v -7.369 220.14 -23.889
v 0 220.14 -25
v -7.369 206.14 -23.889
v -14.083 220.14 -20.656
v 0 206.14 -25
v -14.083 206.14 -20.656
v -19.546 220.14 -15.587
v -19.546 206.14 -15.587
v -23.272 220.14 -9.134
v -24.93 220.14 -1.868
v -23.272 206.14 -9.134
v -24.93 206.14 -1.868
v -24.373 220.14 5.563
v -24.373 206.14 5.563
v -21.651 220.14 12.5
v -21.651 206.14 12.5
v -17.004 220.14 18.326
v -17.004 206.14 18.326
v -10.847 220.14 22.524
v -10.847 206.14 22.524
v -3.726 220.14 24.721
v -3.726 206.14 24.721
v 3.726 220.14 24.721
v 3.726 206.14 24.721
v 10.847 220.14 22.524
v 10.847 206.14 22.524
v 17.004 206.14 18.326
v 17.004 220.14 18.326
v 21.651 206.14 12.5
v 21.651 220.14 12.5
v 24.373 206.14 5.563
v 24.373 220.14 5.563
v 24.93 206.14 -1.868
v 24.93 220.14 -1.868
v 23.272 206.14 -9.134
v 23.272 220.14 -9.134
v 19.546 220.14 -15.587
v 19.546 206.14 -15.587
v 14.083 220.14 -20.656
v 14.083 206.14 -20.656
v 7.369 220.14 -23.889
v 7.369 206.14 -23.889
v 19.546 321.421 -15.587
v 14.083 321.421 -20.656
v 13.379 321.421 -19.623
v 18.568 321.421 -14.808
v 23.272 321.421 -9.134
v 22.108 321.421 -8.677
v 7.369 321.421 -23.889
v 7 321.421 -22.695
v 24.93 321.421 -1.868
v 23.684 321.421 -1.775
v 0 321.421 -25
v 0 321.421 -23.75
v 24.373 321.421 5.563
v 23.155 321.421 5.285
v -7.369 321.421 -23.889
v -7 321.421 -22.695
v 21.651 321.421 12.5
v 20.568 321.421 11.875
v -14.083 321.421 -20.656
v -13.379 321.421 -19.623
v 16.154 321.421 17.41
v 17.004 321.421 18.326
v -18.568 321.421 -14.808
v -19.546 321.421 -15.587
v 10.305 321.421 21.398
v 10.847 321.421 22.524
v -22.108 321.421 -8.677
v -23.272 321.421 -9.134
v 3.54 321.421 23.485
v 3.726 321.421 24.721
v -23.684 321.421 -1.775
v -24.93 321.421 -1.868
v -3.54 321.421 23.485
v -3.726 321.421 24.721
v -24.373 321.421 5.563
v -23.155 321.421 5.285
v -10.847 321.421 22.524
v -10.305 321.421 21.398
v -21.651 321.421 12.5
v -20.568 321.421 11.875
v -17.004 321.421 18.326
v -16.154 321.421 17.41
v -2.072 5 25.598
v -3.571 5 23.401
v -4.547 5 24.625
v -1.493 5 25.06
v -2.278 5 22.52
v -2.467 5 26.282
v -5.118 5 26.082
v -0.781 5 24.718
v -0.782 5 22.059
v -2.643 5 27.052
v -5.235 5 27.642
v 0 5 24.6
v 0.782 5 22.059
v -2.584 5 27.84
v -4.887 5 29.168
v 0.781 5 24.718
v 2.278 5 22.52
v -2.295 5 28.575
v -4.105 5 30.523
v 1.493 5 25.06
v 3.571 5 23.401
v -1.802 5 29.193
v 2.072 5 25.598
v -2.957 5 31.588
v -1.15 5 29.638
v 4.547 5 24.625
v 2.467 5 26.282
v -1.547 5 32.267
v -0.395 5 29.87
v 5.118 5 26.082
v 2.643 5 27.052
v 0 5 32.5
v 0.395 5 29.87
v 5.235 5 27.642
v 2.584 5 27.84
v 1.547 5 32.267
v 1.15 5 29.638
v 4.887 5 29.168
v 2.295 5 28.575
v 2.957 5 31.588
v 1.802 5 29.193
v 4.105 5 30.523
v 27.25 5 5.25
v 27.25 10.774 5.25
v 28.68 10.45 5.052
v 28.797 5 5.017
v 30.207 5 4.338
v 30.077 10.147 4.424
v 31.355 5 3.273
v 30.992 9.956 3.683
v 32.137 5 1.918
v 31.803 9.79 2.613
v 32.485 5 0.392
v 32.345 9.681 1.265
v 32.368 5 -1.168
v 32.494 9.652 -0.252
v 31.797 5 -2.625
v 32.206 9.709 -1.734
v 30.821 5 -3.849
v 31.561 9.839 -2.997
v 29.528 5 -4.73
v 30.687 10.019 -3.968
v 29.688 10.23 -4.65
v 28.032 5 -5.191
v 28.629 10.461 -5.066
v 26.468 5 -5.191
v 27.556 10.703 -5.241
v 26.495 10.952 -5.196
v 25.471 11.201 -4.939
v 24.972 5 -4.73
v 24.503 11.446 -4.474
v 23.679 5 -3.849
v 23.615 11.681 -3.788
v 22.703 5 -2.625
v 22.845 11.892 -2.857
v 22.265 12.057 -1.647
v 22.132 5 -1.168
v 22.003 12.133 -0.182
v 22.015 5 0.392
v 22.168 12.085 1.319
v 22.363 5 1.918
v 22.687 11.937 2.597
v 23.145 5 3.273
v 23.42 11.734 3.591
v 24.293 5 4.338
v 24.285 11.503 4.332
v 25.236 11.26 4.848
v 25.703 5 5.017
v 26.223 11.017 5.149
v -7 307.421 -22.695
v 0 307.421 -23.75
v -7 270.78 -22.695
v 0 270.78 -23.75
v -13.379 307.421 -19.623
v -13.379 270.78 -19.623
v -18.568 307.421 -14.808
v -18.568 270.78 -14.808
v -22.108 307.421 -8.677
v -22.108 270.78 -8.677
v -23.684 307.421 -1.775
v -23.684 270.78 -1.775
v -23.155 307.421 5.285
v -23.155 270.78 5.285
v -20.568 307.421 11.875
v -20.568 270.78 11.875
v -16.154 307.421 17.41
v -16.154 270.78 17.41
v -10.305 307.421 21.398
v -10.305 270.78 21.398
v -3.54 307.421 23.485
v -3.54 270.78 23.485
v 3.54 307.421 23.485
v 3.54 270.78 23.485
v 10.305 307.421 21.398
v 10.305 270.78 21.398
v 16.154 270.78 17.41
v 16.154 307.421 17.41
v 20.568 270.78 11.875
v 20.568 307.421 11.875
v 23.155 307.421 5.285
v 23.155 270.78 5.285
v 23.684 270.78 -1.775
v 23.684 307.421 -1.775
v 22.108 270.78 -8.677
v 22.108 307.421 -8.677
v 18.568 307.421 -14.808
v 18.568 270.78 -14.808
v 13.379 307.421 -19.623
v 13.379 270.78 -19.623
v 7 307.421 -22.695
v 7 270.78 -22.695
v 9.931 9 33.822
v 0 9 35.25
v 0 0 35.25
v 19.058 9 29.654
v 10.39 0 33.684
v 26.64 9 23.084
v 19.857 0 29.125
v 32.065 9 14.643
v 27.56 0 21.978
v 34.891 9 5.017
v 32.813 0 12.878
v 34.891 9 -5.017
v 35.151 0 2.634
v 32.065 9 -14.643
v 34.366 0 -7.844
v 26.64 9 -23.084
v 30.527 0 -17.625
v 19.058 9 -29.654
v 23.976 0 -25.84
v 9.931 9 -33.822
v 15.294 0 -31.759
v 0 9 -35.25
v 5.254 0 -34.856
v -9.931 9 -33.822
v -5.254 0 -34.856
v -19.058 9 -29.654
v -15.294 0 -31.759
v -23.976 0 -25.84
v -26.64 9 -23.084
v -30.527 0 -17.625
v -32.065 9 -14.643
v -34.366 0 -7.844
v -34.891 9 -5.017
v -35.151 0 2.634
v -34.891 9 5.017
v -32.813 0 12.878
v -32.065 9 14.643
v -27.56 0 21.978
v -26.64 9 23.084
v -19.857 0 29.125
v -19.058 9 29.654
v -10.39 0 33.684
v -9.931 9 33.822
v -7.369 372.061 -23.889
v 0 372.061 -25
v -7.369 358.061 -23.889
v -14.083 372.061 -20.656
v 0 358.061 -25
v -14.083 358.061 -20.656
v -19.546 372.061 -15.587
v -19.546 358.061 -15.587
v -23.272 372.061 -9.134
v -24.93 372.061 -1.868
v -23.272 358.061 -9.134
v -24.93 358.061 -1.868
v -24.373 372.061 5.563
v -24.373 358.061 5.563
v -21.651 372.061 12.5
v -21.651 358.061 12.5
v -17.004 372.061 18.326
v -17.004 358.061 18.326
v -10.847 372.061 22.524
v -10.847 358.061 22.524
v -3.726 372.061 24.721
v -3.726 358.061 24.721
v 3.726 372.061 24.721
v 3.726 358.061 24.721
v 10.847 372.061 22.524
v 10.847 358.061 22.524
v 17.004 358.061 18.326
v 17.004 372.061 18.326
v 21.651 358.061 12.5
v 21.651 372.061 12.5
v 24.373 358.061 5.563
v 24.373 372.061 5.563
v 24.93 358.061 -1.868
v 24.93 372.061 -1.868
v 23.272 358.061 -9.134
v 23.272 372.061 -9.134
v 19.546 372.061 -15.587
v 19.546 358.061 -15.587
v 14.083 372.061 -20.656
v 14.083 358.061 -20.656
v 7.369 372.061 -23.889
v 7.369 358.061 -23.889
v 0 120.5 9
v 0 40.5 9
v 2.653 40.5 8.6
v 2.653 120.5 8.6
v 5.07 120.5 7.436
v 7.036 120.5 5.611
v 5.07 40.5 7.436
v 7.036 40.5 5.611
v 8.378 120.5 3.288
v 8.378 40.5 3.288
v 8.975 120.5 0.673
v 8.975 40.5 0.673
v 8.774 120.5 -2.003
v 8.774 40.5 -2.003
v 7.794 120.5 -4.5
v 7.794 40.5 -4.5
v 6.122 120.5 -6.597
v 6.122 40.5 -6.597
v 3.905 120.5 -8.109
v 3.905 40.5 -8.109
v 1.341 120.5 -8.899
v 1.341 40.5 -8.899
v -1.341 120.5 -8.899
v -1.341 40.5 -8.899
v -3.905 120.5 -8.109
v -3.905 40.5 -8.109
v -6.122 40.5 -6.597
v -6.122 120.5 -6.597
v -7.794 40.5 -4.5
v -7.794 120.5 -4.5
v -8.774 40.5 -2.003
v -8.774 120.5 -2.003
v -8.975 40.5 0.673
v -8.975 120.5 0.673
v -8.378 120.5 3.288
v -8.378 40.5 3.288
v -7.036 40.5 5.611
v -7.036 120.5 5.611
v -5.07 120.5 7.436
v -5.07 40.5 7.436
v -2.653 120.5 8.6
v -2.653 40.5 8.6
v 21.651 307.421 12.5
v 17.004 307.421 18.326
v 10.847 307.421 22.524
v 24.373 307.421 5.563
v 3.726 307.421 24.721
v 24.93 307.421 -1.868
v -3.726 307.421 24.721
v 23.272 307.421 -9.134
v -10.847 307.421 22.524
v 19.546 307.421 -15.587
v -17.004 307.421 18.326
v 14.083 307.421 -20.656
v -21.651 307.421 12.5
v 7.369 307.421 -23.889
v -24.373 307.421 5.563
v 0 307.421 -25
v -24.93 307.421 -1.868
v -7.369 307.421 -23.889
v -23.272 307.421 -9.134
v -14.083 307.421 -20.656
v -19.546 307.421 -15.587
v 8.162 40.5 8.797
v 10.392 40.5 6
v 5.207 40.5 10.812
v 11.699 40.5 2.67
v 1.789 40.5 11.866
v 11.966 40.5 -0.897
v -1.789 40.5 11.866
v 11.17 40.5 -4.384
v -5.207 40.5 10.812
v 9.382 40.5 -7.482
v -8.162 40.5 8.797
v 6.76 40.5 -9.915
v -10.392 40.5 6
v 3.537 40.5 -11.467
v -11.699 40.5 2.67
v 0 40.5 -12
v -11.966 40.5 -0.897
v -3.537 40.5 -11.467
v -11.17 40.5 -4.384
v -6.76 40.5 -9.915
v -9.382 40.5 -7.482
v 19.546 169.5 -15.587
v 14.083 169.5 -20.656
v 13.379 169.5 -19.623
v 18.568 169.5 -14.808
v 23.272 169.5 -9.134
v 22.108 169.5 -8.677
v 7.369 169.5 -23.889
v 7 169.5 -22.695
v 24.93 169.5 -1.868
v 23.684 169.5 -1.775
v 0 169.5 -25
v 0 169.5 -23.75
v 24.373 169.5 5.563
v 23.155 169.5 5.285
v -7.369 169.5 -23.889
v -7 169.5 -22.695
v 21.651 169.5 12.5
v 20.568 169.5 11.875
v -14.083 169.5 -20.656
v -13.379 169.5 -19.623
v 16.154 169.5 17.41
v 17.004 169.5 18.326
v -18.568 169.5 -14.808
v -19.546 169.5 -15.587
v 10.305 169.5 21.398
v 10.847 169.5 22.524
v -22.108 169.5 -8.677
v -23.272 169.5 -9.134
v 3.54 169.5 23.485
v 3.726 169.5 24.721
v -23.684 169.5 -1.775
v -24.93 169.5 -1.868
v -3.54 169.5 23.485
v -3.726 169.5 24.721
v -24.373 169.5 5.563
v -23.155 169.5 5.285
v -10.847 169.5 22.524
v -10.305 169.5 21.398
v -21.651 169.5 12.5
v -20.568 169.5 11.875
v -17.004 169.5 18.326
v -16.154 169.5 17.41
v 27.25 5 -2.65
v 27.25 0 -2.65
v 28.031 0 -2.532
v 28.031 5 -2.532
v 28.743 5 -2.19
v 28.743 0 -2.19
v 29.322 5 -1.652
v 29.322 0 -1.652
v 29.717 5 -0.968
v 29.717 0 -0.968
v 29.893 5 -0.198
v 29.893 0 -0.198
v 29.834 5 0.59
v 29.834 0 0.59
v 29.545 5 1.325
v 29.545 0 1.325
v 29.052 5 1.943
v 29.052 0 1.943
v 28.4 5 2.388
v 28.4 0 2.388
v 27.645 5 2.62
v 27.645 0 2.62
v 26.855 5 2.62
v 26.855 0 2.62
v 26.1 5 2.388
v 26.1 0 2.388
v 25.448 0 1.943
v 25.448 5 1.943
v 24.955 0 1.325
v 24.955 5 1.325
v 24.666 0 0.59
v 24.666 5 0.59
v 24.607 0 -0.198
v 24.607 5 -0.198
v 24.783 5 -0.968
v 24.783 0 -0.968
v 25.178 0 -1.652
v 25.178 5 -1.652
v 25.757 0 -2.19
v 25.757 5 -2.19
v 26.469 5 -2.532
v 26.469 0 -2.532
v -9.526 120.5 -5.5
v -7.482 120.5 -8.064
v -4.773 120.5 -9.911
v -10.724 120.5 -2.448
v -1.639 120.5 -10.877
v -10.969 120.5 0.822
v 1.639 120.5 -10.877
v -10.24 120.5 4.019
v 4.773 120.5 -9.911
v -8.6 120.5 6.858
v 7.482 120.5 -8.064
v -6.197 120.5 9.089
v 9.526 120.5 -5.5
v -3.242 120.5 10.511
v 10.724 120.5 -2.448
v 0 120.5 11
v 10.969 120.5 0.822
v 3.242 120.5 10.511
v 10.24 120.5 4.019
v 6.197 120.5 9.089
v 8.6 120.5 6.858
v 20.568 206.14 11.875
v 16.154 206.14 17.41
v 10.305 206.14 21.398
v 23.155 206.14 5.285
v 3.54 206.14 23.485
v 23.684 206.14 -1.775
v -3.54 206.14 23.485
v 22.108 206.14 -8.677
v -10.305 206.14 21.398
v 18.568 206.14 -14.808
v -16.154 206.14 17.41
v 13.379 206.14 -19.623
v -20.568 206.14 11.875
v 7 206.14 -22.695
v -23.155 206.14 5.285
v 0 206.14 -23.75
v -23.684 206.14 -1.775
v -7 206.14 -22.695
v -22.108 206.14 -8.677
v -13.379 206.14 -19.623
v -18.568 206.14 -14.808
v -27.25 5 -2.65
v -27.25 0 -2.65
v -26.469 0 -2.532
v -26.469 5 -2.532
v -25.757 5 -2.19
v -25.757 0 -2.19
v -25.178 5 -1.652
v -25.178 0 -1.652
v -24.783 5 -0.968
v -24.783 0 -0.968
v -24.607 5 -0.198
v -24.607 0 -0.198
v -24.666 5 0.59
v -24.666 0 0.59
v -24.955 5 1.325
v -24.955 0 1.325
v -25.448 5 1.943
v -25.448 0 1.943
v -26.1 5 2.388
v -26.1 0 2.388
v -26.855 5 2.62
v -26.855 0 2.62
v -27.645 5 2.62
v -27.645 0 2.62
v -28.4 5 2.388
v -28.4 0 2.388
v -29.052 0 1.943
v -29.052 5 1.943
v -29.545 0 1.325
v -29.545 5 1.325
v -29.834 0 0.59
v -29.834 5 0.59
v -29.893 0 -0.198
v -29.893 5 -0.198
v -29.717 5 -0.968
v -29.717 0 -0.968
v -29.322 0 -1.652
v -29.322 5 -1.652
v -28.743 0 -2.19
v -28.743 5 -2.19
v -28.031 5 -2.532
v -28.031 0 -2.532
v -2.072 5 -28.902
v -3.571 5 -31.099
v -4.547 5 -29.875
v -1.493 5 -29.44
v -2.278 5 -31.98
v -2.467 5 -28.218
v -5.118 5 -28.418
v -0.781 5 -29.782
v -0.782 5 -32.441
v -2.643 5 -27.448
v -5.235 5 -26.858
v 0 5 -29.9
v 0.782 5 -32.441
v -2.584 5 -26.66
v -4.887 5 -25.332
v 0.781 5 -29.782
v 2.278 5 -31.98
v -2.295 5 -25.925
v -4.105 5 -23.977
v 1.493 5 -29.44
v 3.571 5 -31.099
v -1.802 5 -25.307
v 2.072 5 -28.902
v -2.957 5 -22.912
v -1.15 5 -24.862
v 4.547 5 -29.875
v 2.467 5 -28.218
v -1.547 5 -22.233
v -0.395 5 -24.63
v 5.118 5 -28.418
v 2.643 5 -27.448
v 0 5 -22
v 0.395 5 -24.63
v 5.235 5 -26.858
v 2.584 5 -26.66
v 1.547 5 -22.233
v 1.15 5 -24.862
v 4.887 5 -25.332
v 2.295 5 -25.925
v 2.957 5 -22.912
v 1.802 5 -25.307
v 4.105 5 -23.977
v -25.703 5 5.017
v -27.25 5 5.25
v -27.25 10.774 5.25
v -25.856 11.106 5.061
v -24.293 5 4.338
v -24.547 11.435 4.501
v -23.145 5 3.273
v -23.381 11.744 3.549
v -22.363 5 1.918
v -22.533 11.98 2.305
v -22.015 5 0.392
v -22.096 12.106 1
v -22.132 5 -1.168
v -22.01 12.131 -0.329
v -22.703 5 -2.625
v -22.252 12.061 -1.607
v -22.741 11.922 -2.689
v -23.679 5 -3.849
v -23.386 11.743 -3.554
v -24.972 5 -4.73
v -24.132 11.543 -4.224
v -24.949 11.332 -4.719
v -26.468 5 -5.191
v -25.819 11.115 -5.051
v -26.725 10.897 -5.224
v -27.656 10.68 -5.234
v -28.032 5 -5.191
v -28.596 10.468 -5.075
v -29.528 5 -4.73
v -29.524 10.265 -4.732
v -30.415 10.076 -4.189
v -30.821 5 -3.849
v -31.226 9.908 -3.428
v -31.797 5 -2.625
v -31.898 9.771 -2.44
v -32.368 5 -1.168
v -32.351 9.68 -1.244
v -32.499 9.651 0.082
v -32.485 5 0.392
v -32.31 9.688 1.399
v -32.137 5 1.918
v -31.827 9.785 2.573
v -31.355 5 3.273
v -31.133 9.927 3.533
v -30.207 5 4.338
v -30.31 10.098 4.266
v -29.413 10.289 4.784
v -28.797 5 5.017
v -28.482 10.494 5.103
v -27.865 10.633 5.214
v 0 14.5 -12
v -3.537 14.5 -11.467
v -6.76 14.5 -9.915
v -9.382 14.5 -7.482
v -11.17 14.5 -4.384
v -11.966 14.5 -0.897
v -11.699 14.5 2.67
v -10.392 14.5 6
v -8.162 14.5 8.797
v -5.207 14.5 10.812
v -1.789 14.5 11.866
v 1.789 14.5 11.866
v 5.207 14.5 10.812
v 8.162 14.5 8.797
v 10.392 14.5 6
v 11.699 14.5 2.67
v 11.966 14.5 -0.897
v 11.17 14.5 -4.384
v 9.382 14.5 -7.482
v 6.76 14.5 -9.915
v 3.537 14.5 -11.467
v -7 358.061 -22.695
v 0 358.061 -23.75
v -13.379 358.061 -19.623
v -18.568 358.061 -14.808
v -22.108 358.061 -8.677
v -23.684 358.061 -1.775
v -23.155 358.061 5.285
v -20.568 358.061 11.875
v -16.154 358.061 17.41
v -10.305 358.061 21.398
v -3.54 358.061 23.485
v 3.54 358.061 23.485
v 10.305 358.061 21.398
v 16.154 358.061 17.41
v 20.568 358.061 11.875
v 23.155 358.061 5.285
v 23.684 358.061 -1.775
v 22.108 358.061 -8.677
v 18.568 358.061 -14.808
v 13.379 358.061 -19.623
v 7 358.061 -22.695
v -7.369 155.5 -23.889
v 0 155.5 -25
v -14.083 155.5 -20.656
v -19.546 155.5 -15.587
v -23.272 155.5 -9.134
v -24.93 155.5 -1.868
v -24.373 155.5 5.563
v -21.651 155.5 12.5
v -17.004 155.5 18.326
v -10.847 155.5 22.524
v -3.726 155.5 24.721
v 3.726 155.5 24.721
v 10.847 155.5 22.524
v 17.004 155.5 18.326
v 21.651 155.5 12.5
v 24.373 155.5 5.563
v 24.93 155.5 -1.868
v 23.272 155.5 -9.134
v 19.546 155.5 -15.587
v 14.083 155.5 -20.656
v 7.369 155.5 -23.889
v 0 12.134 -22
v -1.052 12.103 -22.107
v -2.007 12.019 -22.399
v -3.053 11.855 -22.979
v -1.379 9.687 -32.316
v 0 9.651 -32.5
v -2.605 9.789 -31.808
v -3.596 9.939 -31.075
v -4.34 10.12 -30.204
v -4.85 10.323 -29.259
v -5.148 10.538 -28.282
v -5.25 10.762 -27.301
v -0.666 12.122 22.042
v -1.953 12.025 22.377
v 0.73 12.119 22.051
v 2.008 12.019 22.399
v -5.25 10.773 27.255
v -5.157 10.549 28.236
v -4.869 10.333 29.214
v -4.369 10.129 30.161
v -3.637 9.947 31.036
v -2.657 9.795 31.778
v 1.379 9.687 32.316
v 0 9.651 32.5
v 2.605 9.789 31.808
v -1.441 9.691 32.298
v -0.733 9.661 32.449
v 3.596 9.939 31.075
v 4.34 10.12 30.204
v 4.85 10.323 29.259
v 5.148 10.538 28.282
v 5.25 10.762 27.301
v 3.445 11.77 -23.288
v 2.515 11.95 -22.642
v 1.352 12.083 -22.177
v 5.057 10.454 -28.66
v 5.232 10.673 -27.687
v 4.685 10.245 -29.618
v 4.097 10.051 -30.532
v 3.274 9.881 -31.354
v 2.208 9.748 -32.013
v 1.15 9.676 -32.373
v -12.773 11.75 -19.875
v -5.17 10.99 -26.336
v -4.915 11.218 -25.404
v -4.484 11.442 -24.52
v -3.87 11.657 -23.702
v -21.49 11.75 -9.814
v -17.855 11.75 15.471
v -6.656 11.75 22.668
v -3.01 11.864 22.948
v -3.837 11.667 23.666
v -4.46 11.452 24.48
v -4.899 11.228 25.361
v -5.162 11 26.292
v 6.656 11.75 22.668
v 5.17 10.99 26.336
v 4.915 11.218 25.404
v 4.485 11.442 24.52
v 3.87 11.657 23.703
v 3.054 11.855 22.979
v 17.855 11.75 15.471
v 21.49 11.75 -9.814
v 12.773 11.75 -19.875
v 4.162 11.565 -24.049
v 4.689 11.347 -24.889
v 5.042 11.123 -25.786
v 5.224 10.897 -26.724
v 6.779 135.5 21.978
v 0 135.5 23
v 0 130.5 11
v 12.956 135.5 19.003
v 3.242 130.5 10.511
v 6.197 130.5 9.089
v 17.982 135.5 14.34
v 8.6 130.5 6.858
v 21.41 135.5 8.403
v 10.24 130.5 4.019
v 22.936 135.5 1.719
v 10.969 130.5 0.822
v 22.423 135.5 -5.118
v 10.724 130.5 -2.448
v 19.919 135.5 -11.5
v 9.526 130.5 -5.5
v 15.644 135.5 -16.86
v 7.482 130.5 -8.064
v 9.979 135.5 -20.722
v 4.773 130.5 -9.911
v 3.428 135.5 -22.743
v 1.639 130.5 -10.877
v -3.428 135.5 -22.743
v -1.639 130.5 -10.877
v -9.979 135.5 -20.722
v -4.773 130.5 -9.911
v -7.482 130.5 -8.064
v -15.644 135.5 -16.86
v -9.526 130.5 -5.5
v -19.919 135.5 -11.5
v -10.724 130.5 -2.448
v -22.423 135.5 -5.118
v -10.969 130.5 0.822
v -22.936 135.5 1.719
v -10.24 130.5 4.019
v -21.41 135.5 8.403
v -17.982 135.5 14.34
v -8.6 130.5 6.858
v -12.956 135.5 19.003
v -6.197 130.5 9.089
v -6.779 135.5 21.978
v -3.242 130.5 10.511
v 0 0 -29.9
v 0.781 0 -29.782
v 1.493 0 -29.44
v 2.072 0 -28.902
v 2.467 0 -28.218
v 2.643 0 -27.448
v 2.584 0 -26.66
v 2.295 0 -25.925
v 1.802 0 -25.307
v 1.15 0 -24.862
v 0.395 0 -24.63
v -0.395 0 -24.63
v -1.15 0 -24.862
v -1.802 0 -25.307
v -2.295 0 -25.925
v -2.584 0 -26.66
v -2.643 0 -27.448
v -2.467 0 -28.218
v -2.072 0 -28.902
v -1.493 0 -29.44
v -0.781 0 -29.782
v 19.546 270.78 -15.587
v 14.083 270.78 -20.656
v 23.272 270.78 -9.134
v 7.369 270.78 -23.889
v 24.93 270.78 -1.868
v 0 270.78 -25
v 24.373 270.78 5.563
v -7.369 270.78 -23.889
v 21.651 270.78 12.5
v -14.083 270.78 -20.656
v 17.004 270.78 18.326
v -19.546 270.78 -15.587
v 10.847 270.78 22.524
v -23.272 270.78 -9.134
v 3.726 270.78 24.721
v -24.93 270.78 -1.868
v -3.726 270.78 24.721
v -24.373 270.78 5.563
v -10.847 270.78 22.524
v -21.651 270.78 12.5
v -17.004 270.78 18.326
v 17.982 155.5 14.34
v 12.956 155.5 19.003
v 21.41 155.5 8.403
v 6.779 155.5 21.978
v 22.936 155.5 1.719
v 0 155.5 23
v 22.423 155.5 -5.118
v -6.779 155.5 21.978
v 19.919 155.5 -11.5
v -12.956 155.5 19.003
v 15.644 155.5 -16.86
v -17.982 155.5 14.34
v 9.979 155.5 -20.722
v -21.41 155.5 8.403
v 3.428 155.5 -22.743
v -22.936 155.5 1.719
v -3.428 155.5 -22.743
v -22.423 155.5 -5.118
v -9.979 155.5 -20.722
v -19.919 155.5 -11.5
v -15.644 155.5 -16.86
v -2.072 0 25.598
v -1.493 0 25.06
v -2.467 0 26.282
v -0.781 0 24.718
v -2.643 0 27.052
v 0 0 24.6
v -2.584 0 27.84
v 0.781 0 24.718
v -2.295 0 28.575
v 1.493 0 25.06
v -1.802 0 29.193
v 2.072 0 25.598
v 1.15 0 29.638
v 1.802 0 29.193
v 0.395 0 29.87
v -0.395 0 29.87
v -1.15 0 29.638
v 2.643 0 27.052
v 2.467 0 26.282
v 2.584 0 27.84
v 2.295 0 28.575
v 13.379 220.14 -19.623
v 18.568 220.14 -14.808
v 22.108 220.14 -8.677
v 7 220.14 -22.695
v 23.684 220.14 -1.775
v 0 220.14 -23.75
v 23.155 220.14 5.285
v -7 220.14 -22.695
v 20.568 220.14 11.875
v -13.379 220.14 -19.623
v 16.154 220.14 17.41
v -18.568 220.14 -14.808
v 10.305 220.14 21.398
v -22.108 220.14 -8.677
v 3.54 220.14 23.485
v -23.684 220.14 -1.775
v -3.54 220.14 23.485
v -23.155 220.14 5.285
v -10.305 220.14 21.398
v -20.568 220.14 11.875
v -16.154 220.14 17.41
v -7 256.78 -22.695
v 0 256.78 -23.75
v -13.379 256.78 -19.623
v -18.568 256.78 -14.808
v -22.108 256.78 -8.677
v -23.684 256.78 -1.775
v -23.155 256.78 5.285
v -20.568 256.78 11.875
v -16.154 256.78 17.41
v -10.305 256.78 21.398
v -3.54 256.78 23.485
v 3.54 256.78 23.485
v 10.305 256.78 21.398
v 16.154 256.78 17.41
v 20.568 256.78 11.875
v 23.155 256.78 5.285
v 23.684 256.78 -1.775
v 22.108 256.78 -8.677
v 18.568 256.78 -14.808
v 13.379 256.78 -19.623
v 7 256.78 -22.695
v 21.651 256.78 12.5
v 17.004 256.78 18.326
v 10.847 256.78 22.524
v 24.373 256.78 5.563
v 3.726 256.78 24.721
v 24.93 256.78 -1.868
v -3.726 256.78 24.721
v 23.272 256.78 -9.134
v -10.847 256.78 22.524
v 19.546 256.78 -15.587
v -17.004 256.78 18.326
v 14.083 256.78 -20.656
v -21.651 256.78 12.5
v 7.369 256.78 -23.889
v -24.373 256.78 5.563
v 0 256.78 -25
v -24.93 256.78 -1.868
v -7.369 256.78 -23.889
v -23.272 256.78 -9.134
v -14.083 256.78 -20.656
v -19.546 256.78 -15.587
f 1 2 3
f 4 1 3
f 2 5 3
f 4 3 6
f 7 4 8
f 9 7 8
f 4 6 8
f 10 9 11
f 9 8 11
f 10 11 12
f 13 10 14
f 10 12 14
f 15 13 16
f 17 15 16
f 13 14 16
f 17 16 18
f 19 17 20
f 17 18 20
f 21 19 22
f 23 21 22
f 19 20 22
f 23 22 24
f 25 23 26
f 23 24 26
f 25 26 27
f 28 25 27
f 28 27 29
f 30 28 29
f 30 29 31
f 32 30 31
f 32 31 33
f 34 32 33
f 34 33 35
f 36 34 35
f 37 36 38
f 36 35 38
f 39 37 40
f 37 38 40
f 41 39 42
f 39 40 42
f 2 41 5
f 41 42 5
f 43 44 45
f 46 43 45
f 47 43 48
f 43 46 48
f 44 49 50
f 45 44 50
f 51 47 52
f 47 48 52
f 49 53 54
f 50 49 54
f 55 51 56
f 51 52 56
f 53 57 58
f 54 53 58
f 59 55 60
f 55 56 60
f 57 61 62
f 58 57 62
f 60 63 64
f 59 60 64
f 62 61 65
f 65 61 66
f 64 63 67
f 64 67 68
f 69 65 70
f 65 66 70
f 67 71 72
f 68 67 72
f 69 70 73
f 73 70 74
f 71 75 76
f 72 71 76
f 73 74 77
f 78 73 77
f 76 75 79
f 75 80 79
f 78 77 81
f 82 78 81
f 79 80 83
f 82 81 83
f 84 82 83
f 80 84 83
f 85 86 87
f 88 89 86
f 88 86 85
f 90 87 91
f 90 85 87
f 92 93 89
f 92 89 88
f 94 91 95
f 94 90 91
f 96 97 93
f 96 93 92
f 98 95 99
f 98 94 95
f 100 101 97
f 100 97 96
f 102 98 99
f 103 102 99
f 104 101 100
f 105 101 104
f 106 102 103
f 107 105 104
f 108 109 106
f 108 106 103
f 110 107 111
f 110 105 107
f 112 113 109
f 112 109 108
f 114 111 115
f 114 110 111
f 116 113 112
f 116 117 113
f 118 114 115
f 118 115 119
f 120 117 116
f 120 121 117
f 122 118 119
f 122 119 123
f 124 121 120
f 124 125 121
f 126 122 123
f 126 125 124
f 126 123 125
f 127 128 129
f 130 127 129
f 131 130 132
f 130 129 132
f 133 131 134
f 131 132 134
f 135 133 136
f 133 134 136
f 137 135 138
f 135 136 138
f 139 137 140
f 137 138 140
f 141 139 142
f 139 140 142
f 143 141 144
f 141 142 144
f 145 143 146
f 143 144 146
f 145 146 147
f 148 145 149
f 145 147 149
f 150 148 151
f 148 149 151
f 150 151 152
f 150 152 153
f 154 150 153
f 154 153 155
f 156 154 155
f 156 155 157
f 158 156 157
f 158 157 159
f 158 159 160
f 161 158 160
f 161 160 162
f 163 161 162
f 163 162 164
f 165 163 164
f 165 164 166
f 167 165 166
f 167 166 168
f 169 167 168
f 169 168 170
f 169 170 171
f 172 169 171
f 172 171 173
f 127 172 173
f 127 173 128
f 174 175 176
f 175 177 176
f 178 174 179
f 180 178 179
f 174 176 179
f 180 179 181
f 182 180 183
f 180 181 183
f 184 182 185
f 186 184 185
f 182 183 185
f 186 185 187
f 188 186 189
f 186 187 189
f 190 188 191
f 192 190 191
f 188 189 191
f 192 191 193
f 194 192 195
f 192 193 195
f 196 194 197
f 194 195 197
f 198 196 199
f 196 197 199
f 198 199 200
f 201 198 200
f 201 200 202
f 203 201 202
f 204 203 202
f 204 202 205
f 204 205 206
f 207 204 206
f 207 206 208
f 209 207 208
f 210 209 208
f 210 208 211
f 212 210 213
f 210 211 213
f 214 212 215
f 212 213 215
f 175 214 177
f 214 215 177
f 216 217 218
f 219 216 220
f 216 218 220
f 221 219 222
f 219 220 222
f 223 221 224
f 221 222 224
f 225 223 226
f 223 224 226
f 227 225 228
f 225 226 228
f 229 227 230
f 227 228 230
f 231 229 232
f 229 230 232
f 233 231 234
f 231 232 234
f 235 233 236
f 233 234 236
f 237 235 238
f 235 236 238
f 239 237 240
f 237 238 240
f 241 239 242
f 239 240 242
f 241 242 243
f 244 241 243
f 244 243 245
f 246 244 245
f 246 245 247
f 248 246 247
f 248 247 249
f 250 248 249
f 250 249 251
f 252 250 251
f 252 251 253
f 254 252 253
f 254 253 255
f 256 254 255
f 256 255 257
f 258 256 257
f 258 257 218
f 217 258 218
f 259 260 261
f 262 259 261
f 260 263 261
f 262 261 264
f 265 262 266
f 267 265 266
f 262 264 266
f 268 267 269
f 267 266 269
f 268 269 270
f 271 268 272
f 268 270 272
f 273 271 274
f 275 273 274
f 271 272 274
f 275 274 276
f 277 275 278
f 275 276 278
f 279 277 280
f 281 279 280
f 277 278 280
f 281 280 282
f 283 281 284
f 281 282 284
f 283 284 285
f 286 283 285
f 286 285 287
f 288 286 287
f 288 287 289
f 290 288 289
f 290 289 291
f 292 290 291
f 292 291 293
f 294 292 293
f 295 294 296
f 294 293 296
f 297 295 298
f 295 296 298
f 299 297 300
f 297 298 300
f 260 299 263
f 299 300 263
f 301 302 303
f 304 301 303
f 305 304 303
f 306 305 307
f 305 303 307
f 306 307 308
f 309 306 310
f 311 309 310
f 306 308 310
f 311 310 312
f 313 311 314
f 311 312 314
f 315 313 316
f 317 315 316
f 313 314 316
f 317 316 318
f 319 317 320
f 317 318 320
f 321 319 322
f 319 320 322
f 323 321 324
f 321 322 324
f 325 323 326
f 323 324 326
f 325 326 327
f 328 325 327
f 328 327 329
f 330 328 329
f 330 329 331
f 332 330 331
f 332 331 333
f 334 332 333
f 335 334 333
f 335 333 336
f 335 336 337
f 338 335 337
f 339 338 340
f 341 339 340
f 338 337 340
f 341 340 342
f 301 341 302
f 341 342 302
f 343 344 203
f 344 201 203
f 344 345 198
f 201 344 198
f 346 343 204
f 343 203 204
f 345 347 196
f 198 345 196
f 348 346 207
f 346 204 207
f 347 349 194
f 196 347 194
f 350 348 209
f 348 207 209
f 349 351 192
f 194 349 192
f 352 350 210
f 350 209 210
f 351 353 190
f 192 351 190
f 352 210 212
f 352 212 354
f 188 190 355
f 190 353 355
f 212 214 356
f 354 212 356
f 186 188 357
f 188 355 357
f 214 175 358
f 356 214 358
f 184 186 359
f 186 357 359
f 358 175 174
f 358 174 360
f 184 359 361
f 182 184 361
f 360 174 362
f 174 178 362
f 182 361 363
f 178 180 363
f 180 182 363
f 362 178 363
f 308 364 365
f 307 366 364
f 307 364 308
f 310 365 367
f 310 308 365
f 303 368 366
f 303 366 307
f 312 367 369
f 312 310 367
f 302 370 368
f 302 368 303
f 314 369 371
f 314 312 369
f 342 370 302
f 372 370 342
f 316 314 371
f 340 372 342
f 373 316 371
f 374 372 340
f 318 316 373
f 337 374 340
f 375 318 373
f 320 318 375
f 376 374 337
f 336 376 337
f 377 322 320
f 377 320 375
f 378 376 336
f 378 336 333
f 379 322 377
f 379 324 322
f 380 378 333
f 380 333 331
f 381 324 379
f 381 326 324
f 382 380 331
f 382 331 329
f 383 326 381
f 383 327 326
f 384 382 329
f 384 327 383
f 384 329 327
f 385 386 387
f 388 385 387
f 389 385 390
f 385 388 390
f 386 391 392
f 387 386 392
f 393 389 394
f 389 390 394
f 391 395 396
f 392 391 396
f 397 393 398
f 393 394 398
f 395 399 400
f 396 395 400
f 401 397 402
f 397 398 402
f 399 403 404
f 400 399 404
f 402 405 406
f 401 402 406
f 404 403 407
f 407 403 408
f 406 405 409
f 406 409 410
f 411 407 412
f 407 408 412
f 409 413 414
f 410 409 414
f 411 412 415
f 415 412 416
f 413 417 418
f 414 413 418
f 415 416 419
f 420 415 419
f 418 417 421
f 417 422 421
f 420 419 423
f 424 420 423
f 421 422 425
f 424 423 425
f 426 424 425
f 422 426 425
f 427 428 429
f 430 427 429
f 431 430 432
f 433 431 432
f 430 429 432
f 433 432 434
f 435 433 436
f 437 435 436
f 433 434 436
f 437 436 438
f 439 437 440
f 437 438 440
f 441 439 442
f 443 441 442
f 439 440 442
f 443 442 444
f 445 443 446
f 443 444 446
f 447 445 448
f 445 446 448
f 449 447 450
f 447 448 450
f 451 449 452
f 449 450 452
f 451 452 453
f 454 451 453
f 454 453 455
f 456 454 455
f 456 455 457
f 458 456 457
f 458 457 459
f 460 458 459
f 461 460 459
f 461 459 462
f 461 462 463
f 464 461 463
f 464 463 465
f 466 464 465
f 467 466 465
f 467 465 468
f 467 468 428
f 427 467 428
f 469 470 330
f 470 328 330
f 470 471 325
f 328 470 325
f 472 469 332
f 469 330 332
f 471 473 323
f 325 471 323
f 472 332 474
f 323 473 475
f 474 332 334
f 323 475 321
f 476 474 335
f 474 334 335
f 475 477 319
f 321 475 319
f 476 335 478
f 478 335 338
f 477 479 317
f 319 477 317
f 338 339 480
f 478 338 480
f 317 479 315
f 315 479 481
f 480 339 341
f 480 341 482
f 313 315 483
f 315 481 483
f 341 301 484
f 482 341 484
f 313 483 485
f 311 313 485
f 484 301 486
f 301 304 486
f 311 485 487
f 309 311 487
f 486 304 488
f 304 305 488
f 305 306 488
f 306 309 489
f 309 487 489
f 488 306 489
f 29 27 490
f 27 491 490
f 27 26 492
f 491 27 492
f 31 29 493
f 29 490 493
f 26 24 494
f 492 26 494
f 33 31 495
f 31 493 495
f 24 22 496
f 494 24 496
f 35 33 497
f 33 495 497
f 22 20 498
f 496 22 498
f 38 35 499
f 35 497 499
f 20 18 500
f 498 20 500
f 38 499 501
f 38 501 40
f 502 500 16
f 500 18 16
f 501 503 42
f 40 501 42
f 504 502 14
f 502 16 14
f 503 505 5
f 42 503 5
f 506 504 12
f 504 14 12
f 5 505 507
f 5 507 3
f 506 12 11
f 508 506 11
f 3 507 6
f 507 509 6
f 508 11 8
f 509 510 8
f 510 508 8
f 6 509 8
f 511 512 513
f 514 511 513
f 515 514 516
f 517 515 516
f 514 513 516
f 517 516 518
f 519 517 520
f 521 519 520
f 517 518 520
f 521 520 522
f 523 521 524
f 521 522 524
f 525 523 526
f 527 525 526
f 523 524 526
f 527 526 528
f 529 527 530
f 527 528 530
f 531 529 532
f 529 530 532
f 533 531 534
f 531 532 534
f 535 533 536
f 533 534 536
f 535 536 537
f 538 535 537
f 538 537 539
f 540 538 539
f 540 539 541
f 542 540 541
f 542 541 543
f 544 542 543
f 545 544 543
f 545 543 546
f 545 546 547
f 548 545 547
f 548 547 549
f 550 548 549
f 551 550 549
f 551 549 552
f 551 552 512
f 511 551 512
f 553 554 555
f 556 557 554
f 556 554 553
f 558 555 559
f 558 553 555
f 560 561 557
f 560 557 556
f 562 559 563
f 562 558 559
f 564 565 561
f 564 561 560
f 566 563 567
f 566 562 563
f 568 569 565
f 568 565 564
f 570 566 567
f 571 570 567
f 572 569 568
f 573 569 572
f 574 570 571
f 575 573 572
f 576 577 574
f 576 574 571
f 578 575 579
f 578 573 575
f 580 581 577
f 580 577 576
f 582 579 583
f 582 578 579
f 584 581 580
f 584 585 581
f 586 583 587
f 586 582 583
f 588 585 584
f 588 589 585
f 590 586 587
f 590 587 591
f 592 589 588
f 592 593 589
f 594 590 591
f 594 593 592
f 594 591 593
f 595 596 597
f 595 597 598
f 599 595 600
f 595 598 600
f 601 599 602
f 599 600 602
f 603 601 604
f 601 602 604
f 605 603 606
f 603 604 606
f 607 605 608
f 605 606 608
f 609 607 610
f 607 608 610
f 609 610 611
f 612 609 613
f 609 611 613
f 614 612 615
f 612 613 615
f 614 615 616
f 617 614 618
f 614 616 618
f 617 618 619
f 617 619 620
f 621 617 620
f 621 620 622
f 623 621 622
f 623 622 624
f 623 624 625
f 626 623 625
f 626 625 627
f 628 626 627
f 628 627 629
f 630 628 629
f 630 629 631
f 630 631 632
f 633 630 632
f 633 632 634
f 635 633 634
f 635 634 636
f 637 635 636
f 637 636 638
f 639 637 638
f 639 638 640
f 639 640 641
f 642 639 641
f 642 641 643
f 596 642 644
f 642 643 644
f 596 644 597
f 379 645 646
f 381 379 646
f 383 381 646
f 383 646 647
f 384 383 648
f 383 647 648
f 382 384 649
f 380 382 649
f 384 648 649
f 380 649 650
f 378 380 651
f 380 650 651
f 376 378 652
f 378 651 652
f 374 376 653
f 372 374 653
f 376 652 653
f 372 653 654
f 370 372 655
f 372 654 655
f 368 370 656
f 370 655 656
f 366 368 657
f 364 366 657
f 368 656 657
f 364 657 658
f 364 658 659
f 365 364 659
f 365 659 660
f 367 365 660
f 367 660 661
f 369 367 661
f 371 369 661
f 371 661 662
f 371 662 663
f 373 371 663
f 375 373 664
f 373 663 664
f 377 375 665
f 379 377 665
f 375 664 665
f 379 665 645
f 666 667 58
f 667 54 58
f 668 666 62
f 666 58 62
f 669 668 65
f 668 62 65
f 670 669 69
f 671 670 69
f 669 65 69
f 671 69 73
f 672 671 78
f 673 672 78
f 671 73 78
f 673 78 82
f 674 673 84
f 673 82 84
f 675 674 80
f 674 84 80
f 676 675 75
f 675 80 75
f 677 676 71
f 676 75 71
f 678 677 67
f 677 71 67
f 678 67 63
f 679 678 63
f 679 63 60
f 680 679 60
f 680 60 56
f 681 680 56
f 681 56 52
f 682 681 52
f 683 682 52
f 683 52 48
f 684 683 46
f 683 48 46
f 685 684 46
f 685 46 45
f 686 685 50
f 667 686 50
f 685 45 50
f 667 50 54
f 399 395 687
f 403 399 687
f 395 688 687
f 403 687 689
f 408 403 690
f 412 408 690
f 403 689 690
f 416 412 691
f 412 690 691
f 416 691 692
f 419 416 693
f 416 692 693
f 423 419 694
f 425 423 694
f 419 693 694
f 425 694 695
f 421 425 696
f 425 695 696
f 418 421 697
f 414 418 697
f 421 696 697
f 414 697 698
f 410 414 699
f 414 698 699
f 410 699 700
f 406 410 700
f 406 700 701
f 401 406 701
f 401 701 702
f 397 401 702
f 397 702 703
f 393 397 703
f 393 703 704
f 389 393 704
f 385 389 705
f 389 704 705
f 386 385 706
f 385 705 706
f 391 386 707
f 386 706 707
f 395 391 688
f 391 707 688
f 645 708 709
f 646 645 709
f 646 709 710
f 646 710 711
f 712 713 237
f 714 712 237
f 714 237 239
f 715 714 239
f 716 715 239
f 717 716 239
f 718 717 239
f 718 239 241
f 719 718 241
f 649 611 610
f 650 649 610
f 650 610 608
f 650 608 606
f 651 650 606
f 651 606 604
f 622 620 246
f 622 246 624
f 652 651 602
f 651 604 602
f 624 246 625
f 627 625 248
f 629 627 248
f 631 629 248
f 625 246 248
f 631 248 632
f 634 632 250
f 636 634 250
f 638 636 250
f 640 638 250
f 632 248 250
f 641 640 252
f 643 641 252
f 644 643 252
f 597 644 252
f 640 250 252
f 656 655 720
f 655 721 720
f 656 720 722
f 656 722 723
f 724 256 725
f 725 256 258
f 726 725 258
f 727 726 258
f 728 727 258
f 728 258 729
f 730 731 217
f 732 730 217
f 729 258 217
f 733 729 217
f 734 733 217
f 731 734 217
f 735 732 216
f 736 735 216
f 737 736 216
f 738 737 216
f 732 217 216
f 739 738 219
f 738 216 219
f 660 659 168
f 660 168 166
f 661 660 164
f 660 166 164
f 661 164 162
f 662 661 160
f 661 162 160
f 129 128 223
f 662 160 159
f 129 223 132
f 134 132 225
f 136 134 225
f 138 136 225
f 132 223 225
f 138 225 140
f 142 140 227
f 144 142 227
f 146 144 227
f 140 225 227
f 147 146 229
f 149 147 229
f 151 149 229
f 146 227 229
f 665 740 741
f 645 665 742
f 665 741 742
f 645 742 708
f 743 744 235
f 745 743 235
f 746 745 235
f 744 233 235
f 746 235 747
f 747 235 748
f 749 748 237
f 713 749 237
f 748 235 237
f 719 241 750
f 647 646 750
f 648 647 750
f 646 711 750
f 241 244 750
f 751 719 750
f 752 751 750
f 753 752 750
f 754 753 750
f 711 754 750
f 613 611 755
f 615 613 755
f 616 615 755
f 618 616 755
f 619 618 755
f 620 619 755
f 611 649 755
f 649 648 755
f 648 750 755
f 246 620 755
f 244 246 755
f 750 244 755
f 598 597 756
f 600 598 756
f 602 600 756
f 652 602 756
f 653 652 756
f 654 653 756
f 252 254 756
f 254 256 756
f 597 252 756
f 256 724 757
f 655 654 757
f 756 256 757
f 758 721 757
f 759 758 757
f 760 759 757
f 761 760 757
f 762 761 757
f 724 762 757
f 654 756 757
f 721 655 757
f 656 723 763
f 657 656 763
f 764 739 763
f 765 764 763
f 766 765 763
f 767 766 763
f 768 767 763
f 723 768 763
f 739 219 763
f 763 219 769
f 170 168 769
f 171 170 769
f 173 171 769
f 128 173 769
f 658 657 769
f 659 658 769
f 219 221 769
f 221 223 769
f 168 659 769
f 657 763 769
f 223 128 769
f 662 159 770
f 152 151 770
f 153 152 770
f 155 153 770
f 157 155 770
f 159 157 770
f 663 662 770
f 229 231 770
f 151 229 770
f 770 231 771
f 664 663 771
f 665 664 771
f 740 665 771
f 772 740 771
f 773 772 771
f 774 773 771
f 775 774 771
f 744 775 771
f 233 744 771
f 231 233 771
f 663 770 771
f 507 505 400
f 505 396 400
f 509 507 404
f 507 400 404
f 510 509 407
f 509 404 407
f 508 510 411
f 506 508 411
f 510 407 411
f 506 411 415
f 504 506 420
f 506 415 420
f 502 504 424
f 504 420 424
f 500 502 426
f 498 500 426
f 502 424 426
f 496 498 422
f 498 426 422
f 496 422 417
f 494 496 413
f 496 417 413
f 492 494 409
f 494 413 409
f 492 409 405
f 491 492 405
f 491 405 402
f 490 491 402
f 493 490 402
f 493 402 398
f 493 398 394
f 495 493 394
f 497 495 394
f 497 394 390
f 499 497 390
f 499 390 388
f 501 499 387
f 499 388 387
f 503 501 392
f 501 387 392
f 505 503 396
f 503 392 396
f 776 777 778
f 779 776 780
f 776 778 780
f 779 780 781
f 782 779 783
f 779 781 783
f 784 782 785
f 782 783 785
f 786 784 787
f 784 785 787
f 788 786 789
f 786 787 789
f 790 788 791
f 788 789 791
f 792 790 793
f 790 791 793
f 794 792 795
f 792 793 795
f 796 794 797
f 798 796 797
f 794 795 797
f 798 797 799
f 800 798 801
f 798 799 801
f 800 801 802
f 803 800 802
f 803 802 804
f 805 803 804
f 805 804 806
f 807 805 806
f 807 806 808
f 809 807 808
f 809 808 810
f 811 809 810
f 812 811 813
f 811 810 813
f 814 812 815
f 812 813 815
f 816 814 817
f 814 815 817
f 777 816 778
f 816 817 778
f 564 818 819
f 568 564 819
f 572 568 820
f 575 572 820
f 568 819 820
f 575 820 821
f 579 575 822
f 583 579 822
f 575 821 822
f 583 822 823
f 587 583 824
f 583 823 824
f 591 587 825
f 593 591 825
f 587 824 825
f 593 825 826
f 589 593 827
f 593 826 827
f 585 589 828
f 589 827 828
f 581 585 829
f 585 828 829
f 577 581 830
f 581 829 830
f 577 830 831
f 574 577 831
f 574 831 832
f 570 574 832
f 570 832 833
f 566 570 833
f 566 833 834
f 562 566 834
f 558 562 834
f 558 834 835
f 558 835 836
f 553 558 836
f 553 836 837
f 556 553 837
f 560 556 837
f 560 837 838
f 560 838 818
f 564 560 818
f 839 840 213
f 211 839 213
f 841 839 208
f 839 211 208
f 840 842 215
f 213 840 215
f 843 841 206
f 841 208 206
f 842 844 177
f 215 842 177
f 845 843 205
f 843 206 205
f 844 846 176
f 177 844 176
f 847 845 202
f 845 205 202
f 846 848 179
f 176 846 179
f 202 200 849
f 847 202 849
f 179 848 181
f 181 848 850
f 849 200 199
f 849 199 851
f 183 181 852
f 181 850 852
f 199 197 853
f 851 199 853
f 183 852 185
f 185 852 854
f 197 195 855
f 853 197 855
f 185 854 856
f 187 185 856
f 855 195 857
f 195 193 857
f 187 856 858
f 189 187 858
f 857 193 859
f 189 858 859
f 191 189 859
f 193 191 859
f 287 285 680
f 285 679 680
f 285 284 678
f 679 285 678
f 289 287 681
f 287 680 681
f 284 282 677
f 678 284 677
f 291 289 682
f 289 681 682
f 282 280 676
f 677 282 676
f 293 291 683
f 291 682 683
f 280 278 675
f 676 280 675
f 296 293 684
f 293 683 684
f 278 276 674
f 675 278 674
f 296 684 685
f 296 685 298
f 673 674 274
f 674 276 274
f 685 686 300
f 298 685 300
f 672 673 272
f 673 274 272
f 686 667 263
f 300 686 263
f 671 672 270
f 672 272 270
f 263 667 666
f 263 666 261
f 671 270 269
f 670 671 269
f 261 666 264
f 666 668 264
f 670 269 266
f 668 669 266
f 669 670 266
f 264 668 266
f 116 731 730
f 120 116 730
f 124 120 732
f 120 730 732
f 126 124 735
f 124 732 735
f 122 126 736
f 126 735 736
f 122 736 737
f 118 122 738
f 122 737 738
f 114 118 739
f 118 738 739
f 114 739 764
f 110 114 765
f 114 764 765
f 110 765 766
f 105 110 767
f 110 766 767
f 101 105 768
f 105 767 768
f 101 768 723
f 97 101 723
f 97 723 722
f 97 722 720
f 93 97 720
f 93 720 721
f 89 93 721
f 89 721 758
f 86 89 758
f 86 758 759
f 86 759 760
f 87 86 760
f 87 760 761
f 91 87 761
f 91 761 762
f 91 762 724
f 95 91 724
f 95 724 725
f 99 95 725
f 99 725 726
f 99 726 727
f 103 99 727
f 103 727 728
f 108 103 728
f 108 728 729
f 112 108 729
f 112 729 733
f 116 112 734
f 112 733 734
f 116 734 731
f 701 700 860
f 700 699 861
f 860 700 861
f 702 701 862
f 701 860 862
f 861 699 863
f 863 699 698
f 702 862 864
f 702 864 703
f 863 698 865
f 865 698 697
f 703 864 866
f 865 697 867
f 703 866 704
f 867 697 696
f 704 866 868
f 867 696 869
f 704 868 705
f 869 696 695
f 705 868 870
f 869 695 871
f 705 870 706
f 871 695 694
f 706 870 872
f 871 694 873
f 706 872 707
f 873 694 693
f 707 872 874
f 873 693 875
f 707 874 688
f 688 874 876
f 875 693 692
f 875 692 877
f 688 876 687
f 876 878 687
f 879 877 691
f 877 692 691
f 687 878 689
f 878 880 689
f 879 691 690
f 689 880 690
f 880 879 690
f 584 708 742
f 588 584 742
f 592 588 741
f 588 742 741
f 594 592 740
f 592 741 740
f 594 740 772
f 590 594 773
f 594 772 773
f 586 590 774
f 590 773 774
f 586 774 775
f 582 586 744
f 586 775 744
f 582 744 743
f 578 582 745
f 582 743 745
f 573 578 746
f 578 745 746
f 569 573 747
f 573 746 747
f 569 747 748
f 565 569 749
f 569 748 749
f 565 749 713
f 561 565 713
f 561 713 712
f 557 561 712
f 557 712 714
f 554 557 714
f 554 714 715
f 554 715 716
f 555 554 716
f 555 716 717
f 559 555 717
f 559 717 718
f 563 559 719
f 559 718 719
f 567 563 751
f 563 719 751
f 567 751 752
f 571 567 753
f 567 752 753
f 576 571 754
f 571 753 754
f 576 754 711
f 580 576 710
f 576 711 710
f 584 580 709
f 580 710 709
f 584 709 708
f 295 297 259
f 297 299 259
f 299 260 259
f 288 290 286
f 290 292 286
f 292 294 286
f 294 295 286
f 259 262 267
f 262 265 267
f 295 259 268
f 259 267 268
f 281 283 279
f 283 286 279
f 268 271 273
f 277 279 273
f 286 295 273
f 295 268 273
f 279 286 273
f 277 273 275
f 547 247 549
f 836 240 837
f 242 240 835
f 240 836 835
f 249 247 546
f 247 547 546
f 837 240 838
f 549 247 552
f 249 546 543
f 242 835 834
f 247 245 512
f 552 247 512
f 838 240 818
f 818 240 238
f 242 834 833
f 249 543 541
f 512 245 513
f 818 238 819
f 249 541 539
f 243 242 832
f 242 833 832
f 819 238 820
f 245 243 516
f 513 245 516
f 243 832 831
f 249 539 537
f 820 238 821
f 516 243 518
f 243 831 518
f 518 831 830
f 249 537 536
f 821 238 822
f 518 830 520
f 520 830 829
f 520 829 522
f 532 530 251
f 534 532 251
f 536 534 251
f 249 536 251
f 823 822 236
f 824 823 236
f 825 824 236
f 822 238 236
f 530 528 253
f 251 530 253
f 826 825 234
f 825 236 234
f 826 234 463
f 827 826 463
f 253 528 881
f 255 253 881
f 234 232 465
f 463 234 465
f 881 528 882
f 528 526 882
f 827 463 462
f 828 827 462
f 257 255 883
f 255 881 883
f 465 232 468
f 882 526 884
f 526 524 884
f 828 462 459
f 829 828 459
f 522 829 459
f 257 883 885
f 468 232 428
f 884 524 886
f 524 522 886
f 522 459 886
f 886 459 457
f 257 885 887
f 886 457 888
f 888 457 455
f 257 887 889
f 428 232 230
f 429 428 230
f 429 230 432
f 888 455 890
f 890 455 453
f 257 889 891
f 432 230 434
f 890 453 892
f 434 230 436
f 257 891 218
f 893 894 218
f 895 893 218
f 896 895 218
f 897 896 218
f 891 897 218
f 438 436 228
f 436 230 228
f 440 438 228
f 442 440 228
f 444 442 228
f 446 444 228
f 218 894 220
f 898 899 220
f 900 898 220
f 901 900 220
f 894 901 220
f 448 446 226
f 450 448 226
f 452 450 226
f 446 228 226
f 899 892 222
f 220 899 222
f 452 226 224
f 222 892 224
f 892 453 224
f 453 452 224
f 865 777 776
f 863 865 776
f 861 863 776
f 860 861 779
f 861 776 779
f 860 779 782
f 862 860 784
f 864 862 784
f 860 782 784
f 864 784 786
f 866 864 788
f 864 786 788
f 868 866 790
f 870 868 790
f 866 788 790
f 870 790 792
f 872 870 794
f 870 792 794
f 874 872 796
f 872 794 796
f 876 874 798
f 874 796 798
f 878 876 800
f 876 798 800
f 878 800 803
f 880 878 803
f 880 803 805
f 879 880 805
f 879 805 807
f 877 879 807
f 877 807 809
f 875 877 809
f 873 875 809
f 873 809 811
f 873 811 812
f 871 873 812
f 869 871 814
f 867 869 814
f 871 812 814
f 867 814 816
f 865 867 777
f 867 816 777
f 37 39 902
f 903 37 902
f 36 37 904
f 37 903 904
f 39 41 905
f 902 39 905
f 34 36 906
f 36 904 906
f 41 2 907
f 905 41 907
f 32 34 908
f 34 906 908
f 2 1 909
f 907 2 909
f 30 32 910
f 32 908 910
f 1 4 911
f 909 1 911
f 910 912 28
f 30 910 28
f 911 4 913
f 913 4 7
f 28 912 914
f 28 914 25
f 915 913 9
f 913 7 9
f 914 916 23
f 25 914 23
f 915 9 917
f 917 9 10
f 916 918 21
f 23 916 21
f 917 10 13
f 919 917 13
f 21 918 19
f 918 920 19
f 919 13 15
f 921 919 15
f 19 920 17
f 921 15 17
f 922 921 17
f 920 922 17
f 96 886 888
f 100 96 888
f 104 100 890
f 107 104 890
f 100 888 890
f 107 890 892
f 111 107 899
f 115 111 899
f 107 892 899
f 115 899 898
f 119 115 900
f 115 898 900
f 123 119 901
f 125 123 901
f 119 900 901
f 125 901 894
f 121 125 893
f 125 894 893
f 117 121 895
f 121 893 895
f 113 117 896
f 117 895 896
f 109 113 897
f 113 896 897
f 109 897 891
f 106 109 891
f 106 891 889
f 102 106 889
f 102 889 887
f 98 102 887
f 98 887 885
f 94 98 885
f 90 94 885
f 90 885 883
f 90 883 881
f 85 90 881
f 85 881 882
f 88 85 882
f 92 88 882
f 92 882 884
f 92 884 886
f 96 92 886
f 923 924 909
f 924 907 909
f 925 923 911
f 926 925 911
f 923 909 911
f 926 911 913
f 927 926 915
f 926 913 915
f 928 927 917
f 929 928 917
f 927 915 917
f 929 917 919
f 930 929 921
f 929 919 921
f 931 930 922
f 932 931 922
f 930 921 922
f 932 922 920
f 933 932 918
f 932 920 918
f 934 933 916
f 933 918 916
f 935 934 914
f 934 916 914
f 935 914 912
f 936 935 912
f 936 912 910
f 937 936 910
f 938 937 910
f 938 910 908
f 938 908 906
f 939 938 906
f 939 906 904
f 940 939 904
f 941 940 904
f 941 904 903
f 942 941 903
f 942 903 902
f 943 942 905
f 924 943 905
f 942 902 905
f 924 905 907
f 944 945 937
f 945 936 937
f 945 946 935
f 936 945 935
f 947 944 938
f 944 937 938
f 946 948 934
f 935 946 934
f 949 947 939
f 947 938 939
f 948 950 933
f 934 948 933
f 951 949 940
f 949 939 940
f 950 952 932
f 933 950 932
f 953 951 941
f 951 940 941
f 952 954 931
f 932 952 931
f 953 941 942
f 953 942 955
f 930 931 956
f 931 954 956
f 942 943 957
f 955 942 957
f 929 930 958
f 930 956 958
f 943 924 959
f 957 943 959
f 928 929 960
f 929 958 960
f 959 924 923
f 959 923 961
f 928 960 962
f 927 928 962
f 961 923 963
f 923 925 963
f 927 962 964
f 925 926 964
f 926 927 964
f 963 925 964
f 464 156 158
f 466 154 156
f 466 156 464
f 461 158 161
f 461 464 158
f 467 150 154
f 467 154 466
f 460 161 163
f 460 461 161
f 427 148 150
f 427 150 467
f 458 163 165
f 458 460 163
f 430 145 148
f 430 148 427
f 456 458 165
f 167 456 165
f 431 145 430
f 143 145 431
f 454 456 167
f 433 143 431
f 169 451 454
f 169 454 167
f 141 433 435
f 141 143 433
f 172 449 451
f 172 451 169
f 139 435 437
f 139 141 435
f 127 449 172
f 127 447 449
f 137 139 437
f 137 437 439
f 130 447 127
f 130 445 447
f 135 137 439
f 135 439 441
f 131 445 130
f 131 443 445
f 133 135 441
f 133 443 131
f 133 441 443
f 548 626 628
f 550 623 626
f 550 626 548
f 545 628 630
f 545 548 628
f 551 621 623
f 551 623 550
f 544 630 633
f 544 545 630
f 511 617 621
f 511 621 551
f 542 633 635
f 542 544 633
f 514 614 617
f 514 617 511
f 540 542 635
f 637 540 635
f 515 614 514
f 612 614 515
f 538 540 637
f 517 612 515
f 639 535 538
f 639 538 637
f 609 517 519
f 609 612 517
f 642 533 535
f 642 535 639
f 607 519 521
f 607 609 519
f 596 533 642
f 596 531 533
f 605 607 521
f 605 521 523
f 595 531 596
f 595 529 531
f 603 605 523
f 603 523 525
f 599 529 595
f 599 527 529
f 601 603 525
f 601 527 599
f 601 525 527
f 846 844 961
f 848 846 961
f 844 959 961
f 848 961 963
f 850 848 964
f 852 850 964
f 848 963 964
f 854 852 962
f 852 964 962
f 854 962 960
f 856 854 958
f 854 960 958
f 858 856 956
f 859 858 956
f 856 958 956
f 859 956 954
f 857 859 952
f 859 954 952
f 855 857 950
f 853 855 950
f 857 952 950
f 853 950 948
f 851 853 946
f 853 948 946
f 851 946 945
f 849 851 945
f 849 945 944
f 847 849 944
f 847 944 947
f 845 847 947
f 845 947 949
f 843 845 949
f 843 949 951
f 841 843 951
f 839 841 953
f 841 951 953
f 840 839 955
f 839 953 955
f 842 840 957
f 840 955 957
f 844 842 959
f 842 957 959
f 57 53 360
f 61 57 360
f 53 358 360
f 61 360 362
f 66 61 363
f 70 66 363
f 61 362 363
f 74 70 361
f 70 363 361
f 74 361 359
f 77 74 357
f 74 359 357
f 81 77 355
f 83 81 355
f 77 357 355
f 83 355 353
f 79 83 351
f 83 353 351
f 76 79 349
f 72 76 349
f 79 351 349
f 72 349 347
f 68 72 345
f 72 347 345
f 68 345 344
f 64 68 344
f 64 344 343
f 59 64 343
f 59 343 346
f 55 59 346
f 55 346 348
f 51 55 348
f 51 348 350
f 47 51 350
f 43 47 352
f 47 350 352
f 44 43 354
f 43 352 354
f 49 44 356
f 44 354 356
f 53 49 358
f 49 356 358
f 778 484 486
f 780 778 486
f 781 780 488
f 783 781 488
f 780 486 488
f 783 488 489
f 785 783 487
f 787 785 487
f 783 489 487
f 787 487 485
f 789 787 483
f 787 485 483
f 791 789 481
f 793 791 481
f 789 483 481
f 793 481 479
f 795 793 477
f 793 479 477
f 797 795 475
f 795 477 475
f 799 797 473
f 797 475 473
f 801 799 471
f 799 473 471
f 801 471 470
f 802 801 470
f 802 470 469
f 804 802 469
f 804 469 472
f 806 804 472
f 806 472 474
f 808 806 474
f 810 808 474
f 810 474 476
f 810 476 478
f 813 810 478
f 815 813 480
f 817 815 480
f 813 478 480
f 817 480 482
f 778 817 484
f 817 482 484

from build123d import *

# Parameters (mm, degrees)
SKETCH1_R           = 35.25
BOSS_EXTRUDE1_DEPTH = 9
SKETCH3_R           = 12
BOSS_EXTRUDE2_DEPTH = 26
SKETCH4_R           = 9
BOSS_EXTRUDE3_DEPTH = 80
SKETCH5_R           = 11
BOSS_EXTRUDE4_DEPTH = 10
SKETCH7_R           = 23
BOSS_EXTRUDE5_DEPTH = 20
SKETCH9_R           = 2.65
CUT_EXTRUDE1_DEPTH  = 20
CUT_EXTRUDE2_START  = 45
SKETCH11_R          = 5.25
CUT_EXTRUDE2_DEPTH  = 40


with BuildPart() as part:
    # Sketch1 → Boss-Extrude1 (new body)
    with BuildSketch(Plane(origin=(0, 0, 0), x_dir=(1, 0, 0), z_dir=(0, 1, 0))):
        with Locations(Location((0, 0, 0), (0, 0, 270))):
            Circle(SKETCH1_R)
    extrude(amount=BOSS_EXTRUDE1_DEPTH)

    # Sketch2 → Revolve1 (revolve)
    with BuildSketch(Plane.XY, mode=Mode.PRIVATE) as revolve1_sk:
        Polygon((0, 9), (0, 14.5), (12, 14.5), (35.25, 9), align=None)
    revolve(revolve1_sk.sketch.rotate(Axis((0, 9, 0), (0, 1, 0)), 90), axis=Axis((0, 9, 0), (0, 1, 0)))

    # Sketch3 → Boss-Extrude2 (add)
    with BuildSketch(Plane(origin=(0, 14.5, 0), x_dir=(1, 0, 0), z_dir=(0, 1, 0))):
        with Locations(Location((0, 0, 0), (0, 0, 90))):
            Circle(SKETCH3_R)
    extrude(amount=BOSS_EXTRUDE2_DEPTH)

    # Sketch4 → Boss-Extrude3 (add)
    with BuildSketch(Plane(origin=(0, 40.5, 0), x_dir=(1, 0, 0), z_dir=(0, 1, 0))):
        with Locations(Location((0, 0, 0), (0, 0, 270))):
            Circle(SKETCH4_R)
    extrude(amount=BOSS_EXTRUDE3_DEPTH)

    # Sketch5 → Boss-Extrude4 (add)
    with BuildSketch(Plane(origin=(0, 120.5, 0), x_dir=(1, 0, 0), z_dir=(0, 1, 0))):
        with Locations(Location((0, 0, 0), (0, 0, 270))):
            Circle(SKETCH5_R)
    extrude(amount=BOSS_EXTRUDE4_DEPTH)

    # Sketch6 → Revolve2 (revolve)
    with BuildSketch(Plane.XY, mode=Mode.PRIVATE) as revolve2_sk:
        Polygon((0, 130.5), (0, 135.5), (23, 135.5), (11, 130.5), align=None)
    revolve(revolve2_sk.sketch.rotate(Axis((0, 130.5, 0), (0, 1, 0)), 270), axis=Axis((0, 130.5, 0), (0, 1, 0)))

    # Sketch7 → Boss-Extrude5 (add)
    with BuildSketch(Plane(origin=(0, 135.5, 0), x_dir=(1, 0, 0), z_dir=(0, 1, 0))):
        with Locations(Location((0, 0, 0), (0, 0, 270))):
            Circle(SKETCH7_R)
    extrude(amount=BOSS_EXTRUDE5_DEPTH)

    # Sketch8 → Revolve6 (revolve)
    with BuildSketch(Plane.XY, mode=Mode.PRIVATE) as revolve6_sk:
        Polygon((-25, 155.5), (0, 155.5), (0, 372.060698134), (-25, 372.060698134), (-25, 358.060698134), (-23.75, 358.060698134), (-23.75, 321.420523601), (-25, 321.420523601), (-25, 307.420523601), (-23.75, 307.420523601), (-23.75, 270.780349067), (-25, 270.780349067), (-25, 256.780349067), (-23.75, 256.780349067), (-23.75, 220.140174534), (-25, 220.140174534), (-25, 206.140174534), (-23.75, 206.140174534), (-23.75, 169.5), (-25, 169.5), align=None)
    revolve(revolve6_sk.sketch.rotate(Axis((0, 155.5, 0), (0, 1, 0)), 270), axis=Axis((0, 155.5, 0), (0, 1, 0)))

    # Sketch9 → Cut-Extrude1 (cut)
    with BuildSketch(Plane.XZ):
        with Locations(Location((0, 27.25, 0), (0, 0, 270))):
            Circle(SKETCH9_R)
        with Locations(Location((27.25, 0, 0), (0, 0, 270))):
            Circle(SKETCH9_R)
        with Locations(Location((0, -27.25, 0), (0, 0, 270))):
            Circle(SKETCH9_R)
        with Locations(Location((-27.25, 0, 0), (0, 0, 270))):
            Circle(SKETCH9_R)
    extrude(amount=-CUT_EXTRUDE1_DEPTH, mode=Mode.SUBTRACT)

    # Sketch11 → Cut-Extrude2 (cut)
    with BuildSketch(Plane(origin=(0, 0, 0), x_dir=(1, 0, 0), z_dir=(0, 1, 0)).offset(CUT_EXTRUDE2_START)):
        with Locations(Location((0, 27.25, 0), (0, 0, 270))):
            Circle(SKETCH11_R)
        with Locations(Location((27.25, 0, 0), (0, 0, 270))):
            Circle(SKETCH11_R)
        with Locations(Location((0, -27.25, 0), (0, 0, 270))):
            Circle(SKETCH11_R)
        with Locations(Location((-27.25, 0, 0), (0, 0, 270))):
            Circle(SKETCH11_R)
    extrude(amount=-CUT_EXTRUDE2_DEPTH, mode=Mode.SUBTRACT)


solid = part.part
